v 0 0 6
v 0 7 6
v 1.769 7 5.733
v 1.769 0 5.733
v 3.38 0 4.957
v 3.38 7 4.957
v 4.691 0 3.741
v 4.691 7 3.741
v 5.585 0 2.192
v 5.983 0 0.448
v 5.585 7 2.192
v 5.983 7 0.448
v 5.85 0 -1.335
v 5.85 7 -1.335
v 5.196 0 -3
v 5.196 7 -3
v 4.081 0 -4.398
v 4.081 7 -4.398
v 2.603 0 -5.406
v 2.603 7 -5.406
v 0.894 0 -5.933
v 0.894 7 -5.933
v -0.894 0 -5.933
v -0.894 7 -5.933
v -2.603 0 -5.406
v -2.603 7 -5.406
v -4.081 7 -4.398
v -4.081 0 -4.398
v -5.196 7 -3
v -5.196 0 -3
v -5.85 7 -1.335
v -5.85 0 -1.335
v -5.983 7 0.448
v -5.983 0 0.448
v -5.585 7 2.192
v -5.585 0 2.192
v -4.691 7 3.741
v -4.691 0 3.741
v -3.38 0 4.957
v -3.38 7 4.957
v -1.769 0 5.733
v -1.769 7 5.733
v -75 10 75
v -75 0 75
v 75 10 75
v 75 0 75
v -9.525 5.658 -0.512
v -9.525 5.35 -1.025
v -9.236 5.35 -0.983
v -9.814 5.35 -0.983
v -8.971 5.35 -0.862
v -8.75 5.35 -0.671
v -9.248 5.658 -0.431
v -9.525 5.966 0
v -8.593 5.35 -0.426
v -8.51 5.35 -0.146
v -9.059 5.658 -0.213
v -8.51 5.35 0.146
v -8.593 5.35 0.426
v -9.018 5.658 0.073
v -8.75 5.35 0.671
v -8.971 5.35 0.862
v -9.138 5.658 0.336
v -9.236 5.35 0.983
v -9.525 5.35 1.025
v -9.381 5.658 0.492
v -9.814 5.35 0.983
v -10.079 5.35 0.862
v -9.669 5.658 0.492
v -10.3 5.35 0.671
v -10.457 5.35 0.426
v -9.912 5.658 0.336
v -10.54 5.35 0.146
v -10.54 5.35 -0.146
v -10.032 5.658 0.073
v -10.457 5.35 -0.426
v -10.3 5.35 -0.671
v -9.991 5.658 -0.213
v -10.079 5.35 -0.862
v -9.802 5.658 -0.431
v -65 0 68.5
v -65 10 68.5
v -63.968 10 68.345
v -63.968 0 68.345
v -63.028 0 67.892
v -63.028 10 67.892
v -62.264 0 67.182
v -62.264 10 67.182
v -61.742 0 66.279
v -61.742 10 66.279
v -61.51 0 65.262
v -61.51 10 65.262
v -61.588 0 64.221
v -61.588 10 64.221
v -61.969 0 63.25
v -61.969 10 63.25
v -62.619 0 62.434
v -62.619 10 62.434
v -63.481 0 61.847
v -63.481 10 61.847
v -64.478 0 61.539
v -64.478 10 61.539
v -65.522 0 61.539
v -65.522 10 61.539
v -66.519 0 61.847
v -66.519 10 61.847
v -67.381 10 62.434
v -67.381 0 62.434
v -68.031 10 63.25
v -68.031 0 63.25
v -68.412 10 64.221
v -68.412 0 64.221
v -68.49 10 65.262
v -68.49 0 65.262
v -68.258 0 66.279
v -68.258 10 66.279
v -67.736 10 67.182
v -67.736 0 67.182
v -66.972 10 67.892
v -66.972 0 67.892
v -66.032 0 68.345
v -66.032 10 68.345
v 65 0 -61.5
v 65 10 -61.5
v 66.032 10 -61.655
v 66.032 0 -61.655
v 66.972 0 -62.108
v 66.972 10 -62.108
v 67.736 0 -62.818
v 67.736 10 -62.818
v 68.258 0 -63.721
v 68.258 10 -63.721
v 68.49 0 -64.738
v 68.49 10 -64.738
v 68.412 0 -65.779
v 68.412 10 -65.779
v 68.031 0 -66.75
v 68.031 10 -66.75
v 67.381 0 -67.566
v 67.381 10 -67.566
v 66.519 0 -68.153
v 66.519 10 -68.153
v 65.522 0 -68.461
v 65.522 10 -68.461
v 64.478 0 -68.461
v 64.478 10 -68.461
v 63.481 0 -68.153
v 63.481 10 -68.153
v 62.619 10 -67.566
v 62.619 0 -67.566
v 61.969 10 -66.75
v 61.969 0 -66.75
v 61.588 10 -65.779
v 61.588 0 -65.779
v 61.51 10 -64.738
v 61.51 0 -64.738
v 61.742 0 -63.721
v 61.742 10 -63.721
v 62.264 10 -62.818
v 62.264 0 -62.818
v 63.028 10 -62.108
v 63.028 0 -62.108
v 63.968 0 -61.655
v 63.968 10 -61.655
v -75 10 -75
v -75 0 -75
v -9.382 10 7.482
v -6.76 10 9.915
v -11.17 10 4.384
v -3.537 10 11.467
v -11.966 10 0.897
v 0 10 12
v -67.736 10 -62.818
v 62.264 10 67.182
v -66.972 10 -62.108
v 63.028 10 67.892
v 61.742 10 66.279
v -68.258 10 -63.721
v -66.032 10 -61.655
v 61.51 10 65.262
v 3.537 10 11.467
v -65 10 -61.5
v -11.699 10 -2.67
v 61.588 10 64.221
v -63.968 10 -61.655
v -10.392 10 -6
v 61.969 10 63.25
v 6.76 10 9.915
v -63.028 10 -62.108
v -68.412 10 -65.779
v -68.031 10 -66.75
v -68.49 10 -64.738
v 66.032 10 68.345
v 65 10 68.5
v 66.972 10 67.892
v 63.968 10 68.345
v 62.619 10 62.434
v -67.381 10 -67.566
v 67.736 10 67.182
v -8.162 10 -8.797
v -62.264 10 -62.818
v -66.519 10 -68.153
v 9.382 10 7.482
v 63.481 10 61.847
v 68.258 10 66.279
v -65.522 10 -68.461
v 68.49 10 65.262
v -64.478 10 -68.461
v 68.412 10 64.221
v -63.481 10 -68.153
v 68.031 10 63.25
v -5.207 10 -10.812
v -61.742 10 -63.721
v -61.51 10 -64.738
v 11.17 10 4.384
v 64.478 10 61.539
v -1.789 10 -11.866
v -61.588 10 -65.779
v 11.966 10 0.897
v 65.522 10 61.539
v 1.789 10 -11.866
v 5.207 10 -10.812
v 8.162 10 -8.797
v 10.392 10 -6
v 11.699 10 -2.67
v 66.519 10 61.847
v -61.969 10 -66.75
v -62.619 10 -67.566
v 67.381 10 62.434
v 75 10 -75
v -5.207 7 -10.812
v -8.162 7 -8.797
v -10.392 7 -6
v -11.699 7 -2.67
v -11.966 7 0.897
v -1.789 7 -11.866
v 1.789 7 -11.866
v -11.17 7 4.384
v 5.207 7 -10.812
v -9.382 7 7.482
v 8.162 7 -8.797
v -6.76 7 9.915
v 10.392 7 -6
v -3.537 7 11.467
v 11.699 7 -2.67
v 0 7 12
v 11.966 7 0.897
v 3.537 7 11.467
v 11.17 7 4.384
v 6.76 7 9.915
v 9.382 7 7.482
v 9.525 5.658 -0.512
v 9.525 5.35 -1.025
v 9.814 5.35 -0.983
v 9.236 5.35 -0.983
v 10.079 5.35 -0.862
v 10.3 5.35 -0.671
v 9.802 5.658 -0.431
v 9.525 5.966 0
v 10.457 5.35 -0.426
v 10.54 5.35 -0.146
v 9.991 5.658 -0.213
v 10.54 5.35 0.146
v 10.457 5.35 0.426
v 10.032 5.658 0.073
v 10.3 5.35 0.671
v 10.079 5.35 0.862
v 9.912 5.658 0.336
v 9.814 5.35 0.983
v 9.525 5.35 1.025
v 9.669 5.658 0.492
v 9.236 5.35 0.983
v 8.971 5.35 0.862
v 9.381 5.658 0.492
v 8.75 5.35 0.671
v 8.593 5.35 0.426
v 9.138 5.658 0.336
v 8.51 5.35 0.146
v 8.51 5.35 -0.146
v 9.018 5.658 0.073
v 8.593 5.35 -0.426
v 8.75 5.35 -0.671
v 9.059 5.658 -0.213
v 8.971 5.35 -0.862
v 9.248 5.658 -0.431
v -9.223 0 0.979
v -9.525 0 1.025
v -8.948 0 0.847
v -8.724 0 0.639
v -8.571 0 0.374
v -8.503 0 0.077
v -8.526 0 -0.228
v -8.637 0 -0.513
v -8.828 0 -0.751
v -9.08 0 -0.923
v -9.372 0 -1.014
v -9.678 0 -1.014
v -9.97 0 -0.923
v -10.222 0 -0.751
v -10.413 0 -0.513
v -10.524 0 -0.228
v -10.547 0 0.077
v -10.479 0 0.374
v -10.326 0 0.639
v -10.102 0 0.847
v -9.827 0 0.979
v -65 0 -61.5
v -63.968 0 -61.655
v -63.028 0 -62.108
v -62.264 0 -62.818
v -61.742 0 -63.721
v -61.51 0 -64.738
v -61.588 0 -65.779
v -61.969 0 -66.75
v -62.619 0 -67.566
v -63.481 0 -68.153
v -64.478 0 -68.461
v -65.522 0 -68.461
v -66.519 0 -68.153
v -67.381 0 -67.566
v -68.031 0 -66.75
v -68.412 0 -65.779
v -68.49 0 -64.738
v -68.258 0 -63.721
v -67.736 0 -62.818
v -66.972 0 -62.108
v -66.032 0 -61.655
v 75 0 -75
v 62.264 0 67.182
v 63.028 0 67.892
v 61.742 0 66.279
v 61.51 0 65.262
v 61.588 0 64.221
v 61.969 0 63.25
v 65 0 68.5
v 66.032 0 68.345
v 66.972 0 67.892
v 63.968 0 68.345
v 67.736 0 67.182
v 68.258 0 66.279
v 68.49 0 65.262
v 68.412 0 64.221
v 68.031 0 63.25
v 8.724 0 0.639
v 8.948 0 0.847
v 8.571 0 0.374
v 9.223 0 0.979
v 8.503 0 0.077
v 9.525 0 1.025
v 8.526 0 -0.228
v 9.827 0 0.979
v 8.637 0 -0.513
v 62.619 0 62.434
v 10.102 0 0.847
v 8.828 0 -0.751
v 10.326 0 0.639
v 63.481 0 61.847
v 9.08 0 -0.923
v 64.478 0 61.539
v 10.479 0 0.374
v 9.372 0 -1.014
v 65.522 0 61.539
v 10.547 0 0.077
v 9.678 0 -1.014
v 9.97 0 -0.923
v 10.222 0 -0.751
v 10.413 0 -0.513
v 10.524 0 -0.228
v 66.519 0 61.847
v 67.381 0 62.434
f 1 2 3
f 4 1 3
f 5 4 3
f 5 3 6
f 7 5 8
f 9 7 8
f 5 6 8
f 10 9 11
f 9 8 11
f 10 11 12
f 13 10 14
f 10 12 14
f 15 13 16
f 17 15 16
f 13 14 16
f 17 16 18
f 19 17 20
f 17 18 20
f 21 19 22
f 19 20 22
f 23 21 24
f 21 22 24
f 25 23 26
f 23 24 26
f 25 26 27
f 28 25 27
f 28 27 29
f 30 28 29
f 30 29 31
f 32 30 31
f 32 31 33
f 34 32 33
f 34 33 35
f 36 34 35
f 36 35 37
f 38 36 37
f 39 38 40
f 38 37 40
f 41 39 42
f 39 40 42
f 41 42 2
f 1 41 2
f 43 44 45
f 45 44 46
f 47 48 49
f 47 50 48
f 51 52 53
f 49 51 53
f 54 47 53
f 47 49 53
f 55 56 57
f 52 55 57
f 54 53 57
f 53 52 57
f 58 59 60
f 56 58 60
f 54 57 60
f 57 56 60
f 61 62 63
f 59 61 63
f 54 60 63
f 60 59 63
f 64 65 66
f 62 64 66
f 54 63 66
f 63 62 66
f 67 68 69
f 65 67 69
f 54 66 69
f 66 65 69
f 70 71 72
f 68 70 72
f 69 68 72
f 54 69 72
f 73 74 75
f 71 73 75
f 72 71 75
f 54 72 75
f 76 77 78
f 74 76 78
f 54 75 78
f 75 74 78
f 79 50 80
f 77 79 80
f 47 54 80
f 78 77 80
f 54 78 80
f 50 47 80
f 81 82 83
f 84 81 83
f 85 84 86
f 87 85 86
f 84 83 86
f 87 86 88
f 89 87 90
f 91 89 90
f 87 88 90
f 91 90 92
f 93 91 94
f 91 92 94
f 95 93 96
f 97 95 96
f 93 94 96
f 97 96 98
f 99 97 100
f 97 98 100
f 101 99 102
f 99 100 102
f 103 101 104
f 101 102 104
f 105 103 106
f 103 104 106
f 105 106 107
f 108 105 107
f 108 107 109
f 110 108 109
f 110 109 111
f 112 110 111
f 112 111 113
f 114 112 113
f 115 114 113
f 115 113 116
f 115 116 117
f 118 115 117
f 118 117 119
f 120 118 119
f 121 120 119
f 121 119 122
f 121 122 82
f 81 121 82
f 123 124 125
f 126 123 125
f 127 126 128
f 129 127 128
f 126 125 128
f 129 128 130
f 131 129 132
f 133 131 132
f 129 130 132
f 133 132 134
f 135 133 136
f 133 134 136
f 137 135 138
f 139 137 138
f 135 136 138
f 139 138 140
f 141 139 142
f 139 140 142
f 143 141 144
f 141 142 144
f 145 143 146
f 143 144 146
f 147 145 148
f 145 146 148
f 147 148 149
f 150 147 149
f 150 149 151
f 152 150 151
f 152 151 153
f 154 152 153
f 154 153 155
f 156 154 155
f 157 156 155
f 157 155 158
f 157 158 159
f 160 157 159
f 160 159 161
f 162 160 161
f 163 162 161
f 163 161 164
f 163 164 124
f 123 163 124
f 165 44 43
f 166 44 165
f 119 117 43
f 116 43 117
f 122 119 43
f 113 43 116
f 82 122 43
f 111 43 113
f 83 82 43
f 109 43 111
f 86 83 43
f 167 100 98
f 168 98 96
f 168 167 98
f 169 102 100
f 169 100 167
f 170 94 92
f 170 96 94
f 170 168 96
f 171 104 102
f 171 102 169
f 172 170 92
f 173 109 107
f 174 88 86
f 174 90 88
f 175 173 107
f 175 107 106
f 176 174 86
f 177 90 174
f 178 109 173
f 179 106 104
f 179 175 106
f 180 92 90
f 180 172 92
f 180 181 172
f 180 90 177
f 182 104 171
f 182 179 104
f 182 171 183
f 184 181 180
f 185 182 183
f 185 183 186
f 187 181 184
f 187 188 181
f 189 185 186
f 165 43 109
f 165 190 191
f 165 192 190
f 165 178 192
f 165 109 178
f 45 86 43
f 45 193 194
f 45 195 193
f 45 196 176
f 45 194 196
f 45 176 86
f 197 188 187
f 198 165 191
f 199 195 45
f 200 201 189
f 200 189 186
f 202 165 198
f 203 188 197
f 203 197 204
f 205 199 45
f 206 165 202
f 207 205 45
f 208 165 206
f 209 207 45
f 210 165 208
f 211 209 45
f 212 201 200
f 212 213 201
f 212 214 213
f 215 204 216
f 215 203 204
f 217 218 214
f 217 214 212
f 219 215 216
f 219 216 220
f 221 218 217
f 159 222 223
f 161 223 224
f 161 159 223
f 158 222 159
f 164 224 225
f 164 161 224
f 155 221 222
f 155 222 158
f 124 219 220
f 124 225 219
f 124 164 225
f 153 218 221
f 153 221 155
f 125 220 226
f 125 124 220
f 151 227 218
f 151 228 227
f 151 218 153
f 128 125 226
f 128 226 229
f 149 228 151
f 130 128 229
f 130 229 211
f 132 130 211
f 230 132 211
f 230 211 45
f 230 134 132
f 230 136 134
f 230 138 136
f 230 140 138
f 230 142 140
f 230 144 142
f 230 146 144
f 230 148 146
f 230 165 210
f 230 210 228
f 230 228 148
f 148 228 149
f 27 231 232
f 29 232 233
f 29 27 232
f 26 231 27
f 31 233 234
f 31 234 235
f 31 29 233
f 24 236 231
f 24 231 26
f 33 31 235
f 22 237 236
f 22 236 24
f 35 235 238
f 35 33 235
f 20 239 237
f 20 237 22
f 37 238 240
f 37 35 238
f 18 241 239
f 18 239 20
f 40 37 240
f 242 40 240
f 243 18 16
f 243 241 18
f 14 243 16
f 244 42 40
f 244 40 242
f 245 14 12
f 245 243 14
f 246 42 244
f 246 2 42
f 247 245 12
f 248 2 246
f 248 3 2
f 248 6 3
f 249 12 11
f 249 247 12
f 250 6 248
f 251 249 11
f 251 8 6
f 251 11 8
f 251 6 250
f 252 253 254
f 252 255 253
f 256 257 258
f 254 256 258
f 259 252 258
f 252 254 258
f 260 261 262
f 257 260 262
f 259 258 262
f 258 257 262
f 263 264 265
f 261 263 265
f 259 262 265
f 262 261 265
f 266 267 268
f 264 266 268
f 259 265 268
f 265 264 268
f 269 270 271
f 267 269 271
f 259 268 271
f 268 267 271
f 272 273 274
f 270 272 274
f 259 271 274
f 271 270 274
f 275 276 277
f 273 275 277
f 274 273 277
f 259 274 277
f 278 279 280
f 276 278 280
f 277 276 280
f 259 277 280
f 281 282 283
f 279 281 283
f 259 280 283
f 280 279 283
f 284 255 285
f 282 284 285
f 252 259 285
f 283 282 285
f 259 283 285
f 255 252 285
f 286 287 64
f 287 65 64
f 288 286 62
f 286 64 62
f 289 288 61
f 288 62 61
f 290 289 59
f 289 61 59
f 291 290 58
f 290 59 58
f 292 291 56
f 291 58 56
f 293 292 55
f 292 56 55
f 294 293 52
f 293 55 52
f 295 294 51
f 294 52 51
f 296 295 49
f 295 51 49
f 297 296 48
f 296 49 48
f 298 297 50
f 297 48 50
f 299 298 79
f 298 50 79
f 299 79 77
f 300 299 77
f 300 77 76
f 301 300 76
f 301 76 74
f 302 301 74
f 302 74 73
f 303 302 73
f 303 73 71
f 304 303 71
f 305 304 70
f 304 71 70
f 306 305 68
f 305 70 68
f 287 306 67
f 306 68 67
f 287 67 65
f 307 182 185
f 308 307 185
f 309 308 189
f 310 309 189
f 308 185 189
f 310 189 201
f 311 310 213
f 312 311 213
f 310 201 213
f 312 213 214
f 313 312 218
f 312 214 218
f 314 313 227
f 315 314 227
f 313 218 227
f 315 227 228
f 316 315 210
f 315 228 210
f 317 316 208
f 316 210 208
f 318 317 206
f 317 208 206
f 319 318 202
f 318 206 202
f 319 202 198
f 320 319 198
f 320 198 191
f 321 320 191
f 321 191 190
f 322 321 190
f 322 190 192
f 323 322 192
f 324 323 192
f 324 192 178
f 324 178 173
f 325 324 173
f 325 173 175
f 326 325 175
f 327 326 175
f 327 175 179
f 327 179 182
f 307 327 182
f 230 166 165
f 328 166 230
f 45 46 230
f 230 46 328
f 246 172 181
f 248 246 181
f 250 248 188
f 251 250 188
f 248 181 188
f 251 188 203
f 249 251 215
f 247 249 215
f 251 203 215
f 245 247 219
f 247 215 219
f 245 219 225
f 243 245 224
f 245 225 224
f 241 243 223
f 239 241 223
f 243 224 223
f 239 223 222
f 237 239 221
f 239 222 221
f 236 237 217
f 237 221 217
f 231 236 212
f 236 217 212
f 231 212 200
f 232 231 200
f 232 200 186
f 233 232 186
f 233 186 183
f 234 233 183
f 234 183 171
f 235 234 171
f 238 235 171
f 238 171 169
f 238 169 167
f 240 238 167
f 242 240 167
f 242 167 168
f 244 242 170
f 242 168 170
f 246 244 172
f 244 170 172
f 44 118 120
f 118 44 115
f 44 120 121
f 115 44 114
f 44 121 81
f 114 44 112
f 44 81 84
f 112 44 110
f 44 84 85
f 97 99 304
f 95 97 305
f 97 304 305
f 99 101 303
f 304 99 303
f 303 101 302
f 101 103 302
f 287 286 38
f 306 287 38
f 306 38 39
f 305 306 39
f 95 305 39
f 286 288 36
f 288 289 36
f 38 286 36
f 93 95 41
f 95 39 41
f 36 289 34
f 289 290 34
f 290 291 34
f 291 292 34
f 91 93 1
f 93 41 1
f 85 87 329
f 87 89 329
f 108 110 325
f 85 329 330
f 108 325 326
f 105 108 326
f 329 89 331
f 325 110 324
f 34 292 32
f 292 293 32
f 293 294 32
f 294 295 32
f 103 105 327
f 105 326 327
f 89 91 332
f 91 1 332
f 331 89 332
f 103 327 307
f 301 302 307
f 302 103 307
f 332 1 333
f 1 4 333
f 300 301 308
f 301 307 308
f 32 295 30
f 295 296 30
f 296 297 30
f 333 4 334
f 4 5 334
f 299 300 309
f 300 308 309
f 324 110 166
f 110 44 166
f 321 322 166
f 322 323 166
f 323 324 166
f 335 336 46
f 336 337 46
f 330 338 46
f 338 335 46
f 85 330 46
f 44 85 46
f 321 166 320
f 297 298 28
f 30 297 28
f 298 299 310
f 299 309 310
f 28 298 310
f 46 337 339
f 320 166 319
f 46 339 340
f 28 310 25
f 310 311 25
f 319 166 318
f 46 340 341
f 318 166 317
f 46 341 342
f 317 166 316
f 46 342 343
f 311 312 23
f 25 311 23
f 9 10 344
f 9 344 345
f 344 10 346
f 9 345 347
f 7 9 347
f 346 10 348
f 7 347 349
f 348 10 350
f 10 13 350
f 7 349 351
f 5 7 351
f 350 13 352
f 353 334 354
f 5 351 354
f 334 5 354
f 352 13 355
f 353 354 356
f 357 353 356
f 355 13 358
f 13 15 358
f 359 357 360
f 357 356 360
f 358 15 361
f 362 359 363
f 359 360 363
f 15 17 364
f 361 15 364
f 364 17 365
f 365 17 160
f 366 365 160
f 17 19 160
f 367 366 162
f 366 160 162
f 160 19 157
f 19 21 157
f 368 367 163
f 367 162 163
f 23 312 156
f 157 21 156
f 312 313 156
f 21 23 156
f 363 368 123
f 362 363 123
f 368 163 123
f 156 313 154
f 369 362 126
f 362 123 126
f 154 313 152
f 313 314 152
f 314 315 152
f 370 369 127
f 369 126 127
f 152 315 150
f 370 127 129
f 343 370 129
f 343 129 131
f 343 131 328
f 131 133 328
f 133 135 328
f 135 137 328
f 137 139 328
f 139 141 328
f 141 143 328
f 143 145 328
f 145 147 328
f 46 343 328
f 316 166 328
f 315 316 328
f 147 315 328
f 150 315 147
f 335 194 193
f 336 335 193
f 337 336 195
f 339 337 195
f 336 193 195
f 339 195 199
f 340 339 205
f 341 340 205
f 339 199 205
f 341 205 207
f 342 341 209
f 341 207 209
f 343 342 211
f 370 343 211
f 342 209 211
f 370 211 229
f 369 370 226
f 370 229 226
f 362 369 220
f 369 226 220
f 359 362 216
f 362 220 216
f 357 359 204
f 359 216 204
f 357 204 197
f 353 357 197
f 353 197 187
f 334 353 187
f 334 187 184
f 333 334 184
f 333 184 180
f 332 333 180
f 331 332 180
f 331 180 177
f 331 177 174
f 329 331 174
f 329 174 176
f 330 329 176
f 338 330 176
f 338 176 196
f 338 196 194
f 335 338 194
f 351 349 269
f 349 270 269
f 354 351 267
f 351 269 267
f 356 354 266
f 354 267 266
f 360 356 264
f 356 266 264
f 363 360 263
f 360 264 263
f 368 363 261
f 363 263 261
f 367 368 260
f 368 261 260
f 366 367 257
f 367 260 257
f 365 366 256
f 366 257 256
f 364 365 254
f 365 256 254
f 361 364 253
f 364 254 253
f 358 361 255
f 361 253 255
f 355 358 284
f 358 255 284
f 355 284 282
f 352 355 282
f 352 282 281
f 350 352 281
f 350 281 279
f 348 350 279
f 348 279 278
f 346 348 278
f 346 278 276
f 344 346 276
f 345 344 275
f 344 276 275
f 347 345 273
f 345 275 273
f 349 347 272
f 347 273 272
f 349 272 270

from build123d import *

# Parameters (mm, degrees)
SKETCH1_W               = 150
SKETCH1_H               = 150
BOSS_EXTRUDE1_DEPTH     = 10
SKETCH2_R               = 12
CUT_EXTRUDE1_DEPTH      = 3
SKETCH3_R               = 6
CUT_EXTRUDE2_DEPTH      = 7
HOLE1_D                 = 7
M2_5_TAPPED_HOLE1_D     = 2.05
M2_5_TAPPED_HOLE1_DEPTH = 5.35
M2_5_TAPPED_HOLE1_TIP   = 0.615882135


with BuildPart() as part:
    # Sketch1 → Boss-Extrude1 (new body)
    with BuildSketch(Plane(origin=(0, 0, 0), x_dir=(1, 0, 0), z_dir=(0, 1, 0))):
        Rectangle(SKETCH1_W, SKETCH1_H)
    extrude(amount=BOSS_EXTRUDE1_DEPTH)

    # Sketch2 → Cut-Extrude1 (cut)
    with BuildSketch(Plane(origin=(0, 10, 0), x_dir=(1, 0, 0), z_dir=(0, 1, 0))):
        with Locations(Location((0, 0, 0), (0, 0, 270))):
            Circle(SKETCH2_R)
    extrude(amount=-CUT_EXTRUDE1_DEPTH, mode=Mode.SUBTRACT)

    # Sketch3 → Cut-Extrude2 (cut)
    with BuildSketch(Plane(origin=(0, 7, 0), x_dir=(1, 0, 0), z_dir=(0, 1, 0))):
        with Locations(Location((0, 0, 0), (0, 0, 270))):
            Circle(SKETCH3_R)
    extrude(amount=-CUT_EXTRUDE2_DEPTH, mode=Mode.SUBTRACT)

    # Hole1 (through all)
    with Locations(Plane(origin=(65, 0, 65), x_dir=(0, 0, -1), z_dir=(0, -1, 0))):
        with Locations((0, 0), (130, 0), (130, -130), (0, -130)):
            Hole(HOLE1_D / 2)

    # M2.5 Tapped Hole1
    with Locations(Plane(origin=(-9.525, 0, 0), x_dir=(0, 0, -1), z_dir=(0, -1, 0))):
        with Locations((0, 0), (0, 19.05)):
            Hole(M2_5_TAPPED_HOLE1_D / 2, depth=M2_5_TAPPED_HOLE1_DEPTH)
            with Locations((0, 0, -(M2_5_TAPPED_HOLE1_DEPTH + M2_5_TAPPED_HOLE1_TIP / 2))):  # 118° drill point
                Cone(0, M2_5_TAPPED_HOLE1_D / 2, M2_5_TAPPED_HOLE1_TIP, mode=Mode.SUBTRACT)


solid = part.part
